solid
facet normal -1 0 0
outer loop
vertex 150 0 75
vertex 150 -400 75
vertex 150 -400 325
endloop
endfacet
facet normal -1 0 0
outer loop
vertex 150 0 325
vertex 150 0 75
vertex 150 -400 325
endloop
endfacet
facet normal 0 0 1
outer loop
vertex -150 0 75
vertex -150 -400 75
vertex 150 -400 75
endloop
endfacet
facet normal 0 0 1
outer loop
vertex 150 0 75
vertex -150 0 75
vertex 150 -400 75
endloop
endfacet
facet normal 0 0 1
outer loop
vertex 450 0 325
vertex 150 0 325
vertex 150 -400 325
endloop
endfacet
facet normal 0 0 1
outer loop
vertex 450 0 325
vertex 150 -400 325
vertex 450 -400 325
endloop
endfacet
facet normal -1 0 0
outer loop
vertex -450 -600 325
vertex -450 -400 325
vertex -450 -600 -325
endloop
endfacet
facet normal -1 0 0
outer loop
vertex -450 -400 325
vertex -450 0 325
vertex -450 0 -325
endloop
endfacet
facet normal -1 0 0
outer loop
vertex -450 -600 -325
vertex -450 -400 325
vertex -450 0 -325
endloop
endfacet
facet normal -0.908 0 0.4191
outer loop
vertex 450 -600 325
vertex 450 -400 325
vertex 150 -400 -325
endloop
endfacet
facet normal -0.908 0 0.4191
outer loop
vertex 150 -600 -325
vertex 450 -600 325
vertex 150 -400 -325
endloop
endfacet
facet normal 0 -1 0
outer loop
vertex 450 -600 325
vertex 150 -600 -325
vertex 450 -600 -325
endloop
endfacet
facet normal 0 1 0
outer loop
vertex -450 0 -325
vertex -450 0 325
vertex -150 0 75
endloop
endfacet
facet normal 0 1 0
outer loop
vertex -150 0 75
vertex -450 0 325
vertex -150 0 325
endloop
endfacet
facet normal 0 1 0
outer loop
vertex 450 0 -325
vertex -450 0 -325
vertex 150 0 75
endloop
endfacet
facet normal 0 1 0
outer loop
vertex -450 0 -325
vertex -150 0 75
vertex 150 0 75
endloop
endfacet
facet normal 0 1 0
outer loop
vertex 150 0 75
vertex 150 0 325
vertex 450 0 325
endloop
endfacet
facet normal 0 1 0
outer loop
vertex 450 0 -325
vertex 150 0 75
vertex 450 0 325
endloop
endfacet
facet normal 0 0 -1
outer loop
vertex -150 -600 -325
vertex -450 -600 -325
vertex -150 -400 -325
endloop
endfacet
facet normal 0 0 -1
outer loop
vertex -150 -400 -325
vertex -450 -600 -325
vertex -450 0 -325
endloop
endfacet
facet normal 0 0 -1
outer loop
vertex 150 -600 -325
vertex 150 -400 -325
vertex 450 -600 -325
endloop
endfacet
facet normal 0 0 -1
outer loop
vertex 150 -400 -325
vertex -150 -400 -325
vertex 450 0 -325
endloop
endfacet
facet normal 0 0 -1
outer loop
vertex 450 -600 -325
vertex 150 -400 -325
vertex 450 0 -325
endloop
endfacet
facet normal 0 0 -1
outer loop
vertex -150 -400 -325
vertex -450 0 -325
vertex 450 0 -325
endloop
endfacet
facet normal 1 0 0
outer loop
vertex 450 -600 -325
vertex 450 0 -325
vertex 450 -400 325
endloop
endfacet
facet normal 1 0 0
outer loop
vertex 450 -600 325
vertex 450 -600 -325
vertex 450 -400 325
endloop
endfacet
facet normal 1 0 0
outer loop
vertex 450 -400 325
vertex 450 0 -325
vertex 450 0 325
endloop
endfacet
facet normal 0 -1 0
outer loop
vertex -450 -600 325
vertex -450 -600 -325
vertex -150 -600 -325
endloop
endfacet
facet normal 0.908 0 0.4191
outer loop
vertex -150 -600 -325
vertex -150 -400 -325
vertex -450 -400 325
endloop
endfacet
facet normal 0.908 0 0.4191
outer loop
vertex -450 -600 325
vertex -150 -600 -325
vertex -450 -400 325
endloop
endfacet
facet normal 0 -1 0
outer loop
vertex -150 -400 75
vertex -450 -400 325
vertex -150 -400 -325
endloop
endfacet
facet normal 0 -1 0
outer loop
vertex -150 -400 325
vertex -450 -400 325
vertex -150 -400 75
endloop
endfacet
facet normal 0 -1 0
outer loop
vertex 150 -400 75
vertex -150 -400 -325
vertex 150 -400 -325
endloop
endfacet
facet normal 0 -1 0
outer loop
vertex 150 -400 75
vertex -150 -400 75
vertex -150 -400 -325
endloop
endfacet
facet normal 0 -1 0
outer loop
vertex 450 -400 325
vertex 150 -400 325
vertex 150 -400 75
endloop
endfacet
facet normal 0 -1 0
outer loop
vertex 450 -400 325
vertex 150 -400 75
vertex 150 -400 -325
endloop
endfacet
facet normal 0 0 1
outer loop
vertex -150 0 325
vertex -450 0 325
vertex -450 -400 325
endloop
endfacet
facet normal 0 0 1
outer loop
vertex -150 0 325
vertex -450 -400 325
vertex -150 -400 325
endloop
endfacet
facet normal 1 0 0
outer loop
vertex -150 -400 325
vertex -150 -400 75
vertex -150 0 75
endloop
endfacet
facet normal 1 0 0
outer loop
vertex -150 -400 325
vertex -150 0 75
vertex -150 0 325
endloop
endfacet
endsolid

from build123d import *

# Parameters (mm, degrees)
F0_W     = 900
F0_H     = 650
F1_DEPTH = 400
F2_W     = 300
F2_H     = 250
F3_DEPTH = 400.001
F5_DEPTH = 200


with BuildPart() as f1:
    # F0 (on Front) → F1 (new body)
    with BuildSketch(Plane.XZ):
        Rectangle(F0_W, F0_H)
    extrude(amount=F1_DEPTH)

    # F2 (on face) → F3 (cut, through all)
    with BuildSketch(Plane.XZ.offset(400)):
        with Locations((0, 200)):
            Rectangle(F2_W, F2_H)
    extrude(amount=-F3_DEPTH, mode=Mode.SUBTRACT)

    # F4 (on face) → F5 (join)
    with BuildSketch(Plane.XZ.offset(400)):
        Polygon((-150, -325), (-450, 325), (-450, -325), align=None)
        Polygon((450, -325), (450, 325), (150, -325), align=None)
    extrude(amount=F5_DEPTH)


solid = f1.part
